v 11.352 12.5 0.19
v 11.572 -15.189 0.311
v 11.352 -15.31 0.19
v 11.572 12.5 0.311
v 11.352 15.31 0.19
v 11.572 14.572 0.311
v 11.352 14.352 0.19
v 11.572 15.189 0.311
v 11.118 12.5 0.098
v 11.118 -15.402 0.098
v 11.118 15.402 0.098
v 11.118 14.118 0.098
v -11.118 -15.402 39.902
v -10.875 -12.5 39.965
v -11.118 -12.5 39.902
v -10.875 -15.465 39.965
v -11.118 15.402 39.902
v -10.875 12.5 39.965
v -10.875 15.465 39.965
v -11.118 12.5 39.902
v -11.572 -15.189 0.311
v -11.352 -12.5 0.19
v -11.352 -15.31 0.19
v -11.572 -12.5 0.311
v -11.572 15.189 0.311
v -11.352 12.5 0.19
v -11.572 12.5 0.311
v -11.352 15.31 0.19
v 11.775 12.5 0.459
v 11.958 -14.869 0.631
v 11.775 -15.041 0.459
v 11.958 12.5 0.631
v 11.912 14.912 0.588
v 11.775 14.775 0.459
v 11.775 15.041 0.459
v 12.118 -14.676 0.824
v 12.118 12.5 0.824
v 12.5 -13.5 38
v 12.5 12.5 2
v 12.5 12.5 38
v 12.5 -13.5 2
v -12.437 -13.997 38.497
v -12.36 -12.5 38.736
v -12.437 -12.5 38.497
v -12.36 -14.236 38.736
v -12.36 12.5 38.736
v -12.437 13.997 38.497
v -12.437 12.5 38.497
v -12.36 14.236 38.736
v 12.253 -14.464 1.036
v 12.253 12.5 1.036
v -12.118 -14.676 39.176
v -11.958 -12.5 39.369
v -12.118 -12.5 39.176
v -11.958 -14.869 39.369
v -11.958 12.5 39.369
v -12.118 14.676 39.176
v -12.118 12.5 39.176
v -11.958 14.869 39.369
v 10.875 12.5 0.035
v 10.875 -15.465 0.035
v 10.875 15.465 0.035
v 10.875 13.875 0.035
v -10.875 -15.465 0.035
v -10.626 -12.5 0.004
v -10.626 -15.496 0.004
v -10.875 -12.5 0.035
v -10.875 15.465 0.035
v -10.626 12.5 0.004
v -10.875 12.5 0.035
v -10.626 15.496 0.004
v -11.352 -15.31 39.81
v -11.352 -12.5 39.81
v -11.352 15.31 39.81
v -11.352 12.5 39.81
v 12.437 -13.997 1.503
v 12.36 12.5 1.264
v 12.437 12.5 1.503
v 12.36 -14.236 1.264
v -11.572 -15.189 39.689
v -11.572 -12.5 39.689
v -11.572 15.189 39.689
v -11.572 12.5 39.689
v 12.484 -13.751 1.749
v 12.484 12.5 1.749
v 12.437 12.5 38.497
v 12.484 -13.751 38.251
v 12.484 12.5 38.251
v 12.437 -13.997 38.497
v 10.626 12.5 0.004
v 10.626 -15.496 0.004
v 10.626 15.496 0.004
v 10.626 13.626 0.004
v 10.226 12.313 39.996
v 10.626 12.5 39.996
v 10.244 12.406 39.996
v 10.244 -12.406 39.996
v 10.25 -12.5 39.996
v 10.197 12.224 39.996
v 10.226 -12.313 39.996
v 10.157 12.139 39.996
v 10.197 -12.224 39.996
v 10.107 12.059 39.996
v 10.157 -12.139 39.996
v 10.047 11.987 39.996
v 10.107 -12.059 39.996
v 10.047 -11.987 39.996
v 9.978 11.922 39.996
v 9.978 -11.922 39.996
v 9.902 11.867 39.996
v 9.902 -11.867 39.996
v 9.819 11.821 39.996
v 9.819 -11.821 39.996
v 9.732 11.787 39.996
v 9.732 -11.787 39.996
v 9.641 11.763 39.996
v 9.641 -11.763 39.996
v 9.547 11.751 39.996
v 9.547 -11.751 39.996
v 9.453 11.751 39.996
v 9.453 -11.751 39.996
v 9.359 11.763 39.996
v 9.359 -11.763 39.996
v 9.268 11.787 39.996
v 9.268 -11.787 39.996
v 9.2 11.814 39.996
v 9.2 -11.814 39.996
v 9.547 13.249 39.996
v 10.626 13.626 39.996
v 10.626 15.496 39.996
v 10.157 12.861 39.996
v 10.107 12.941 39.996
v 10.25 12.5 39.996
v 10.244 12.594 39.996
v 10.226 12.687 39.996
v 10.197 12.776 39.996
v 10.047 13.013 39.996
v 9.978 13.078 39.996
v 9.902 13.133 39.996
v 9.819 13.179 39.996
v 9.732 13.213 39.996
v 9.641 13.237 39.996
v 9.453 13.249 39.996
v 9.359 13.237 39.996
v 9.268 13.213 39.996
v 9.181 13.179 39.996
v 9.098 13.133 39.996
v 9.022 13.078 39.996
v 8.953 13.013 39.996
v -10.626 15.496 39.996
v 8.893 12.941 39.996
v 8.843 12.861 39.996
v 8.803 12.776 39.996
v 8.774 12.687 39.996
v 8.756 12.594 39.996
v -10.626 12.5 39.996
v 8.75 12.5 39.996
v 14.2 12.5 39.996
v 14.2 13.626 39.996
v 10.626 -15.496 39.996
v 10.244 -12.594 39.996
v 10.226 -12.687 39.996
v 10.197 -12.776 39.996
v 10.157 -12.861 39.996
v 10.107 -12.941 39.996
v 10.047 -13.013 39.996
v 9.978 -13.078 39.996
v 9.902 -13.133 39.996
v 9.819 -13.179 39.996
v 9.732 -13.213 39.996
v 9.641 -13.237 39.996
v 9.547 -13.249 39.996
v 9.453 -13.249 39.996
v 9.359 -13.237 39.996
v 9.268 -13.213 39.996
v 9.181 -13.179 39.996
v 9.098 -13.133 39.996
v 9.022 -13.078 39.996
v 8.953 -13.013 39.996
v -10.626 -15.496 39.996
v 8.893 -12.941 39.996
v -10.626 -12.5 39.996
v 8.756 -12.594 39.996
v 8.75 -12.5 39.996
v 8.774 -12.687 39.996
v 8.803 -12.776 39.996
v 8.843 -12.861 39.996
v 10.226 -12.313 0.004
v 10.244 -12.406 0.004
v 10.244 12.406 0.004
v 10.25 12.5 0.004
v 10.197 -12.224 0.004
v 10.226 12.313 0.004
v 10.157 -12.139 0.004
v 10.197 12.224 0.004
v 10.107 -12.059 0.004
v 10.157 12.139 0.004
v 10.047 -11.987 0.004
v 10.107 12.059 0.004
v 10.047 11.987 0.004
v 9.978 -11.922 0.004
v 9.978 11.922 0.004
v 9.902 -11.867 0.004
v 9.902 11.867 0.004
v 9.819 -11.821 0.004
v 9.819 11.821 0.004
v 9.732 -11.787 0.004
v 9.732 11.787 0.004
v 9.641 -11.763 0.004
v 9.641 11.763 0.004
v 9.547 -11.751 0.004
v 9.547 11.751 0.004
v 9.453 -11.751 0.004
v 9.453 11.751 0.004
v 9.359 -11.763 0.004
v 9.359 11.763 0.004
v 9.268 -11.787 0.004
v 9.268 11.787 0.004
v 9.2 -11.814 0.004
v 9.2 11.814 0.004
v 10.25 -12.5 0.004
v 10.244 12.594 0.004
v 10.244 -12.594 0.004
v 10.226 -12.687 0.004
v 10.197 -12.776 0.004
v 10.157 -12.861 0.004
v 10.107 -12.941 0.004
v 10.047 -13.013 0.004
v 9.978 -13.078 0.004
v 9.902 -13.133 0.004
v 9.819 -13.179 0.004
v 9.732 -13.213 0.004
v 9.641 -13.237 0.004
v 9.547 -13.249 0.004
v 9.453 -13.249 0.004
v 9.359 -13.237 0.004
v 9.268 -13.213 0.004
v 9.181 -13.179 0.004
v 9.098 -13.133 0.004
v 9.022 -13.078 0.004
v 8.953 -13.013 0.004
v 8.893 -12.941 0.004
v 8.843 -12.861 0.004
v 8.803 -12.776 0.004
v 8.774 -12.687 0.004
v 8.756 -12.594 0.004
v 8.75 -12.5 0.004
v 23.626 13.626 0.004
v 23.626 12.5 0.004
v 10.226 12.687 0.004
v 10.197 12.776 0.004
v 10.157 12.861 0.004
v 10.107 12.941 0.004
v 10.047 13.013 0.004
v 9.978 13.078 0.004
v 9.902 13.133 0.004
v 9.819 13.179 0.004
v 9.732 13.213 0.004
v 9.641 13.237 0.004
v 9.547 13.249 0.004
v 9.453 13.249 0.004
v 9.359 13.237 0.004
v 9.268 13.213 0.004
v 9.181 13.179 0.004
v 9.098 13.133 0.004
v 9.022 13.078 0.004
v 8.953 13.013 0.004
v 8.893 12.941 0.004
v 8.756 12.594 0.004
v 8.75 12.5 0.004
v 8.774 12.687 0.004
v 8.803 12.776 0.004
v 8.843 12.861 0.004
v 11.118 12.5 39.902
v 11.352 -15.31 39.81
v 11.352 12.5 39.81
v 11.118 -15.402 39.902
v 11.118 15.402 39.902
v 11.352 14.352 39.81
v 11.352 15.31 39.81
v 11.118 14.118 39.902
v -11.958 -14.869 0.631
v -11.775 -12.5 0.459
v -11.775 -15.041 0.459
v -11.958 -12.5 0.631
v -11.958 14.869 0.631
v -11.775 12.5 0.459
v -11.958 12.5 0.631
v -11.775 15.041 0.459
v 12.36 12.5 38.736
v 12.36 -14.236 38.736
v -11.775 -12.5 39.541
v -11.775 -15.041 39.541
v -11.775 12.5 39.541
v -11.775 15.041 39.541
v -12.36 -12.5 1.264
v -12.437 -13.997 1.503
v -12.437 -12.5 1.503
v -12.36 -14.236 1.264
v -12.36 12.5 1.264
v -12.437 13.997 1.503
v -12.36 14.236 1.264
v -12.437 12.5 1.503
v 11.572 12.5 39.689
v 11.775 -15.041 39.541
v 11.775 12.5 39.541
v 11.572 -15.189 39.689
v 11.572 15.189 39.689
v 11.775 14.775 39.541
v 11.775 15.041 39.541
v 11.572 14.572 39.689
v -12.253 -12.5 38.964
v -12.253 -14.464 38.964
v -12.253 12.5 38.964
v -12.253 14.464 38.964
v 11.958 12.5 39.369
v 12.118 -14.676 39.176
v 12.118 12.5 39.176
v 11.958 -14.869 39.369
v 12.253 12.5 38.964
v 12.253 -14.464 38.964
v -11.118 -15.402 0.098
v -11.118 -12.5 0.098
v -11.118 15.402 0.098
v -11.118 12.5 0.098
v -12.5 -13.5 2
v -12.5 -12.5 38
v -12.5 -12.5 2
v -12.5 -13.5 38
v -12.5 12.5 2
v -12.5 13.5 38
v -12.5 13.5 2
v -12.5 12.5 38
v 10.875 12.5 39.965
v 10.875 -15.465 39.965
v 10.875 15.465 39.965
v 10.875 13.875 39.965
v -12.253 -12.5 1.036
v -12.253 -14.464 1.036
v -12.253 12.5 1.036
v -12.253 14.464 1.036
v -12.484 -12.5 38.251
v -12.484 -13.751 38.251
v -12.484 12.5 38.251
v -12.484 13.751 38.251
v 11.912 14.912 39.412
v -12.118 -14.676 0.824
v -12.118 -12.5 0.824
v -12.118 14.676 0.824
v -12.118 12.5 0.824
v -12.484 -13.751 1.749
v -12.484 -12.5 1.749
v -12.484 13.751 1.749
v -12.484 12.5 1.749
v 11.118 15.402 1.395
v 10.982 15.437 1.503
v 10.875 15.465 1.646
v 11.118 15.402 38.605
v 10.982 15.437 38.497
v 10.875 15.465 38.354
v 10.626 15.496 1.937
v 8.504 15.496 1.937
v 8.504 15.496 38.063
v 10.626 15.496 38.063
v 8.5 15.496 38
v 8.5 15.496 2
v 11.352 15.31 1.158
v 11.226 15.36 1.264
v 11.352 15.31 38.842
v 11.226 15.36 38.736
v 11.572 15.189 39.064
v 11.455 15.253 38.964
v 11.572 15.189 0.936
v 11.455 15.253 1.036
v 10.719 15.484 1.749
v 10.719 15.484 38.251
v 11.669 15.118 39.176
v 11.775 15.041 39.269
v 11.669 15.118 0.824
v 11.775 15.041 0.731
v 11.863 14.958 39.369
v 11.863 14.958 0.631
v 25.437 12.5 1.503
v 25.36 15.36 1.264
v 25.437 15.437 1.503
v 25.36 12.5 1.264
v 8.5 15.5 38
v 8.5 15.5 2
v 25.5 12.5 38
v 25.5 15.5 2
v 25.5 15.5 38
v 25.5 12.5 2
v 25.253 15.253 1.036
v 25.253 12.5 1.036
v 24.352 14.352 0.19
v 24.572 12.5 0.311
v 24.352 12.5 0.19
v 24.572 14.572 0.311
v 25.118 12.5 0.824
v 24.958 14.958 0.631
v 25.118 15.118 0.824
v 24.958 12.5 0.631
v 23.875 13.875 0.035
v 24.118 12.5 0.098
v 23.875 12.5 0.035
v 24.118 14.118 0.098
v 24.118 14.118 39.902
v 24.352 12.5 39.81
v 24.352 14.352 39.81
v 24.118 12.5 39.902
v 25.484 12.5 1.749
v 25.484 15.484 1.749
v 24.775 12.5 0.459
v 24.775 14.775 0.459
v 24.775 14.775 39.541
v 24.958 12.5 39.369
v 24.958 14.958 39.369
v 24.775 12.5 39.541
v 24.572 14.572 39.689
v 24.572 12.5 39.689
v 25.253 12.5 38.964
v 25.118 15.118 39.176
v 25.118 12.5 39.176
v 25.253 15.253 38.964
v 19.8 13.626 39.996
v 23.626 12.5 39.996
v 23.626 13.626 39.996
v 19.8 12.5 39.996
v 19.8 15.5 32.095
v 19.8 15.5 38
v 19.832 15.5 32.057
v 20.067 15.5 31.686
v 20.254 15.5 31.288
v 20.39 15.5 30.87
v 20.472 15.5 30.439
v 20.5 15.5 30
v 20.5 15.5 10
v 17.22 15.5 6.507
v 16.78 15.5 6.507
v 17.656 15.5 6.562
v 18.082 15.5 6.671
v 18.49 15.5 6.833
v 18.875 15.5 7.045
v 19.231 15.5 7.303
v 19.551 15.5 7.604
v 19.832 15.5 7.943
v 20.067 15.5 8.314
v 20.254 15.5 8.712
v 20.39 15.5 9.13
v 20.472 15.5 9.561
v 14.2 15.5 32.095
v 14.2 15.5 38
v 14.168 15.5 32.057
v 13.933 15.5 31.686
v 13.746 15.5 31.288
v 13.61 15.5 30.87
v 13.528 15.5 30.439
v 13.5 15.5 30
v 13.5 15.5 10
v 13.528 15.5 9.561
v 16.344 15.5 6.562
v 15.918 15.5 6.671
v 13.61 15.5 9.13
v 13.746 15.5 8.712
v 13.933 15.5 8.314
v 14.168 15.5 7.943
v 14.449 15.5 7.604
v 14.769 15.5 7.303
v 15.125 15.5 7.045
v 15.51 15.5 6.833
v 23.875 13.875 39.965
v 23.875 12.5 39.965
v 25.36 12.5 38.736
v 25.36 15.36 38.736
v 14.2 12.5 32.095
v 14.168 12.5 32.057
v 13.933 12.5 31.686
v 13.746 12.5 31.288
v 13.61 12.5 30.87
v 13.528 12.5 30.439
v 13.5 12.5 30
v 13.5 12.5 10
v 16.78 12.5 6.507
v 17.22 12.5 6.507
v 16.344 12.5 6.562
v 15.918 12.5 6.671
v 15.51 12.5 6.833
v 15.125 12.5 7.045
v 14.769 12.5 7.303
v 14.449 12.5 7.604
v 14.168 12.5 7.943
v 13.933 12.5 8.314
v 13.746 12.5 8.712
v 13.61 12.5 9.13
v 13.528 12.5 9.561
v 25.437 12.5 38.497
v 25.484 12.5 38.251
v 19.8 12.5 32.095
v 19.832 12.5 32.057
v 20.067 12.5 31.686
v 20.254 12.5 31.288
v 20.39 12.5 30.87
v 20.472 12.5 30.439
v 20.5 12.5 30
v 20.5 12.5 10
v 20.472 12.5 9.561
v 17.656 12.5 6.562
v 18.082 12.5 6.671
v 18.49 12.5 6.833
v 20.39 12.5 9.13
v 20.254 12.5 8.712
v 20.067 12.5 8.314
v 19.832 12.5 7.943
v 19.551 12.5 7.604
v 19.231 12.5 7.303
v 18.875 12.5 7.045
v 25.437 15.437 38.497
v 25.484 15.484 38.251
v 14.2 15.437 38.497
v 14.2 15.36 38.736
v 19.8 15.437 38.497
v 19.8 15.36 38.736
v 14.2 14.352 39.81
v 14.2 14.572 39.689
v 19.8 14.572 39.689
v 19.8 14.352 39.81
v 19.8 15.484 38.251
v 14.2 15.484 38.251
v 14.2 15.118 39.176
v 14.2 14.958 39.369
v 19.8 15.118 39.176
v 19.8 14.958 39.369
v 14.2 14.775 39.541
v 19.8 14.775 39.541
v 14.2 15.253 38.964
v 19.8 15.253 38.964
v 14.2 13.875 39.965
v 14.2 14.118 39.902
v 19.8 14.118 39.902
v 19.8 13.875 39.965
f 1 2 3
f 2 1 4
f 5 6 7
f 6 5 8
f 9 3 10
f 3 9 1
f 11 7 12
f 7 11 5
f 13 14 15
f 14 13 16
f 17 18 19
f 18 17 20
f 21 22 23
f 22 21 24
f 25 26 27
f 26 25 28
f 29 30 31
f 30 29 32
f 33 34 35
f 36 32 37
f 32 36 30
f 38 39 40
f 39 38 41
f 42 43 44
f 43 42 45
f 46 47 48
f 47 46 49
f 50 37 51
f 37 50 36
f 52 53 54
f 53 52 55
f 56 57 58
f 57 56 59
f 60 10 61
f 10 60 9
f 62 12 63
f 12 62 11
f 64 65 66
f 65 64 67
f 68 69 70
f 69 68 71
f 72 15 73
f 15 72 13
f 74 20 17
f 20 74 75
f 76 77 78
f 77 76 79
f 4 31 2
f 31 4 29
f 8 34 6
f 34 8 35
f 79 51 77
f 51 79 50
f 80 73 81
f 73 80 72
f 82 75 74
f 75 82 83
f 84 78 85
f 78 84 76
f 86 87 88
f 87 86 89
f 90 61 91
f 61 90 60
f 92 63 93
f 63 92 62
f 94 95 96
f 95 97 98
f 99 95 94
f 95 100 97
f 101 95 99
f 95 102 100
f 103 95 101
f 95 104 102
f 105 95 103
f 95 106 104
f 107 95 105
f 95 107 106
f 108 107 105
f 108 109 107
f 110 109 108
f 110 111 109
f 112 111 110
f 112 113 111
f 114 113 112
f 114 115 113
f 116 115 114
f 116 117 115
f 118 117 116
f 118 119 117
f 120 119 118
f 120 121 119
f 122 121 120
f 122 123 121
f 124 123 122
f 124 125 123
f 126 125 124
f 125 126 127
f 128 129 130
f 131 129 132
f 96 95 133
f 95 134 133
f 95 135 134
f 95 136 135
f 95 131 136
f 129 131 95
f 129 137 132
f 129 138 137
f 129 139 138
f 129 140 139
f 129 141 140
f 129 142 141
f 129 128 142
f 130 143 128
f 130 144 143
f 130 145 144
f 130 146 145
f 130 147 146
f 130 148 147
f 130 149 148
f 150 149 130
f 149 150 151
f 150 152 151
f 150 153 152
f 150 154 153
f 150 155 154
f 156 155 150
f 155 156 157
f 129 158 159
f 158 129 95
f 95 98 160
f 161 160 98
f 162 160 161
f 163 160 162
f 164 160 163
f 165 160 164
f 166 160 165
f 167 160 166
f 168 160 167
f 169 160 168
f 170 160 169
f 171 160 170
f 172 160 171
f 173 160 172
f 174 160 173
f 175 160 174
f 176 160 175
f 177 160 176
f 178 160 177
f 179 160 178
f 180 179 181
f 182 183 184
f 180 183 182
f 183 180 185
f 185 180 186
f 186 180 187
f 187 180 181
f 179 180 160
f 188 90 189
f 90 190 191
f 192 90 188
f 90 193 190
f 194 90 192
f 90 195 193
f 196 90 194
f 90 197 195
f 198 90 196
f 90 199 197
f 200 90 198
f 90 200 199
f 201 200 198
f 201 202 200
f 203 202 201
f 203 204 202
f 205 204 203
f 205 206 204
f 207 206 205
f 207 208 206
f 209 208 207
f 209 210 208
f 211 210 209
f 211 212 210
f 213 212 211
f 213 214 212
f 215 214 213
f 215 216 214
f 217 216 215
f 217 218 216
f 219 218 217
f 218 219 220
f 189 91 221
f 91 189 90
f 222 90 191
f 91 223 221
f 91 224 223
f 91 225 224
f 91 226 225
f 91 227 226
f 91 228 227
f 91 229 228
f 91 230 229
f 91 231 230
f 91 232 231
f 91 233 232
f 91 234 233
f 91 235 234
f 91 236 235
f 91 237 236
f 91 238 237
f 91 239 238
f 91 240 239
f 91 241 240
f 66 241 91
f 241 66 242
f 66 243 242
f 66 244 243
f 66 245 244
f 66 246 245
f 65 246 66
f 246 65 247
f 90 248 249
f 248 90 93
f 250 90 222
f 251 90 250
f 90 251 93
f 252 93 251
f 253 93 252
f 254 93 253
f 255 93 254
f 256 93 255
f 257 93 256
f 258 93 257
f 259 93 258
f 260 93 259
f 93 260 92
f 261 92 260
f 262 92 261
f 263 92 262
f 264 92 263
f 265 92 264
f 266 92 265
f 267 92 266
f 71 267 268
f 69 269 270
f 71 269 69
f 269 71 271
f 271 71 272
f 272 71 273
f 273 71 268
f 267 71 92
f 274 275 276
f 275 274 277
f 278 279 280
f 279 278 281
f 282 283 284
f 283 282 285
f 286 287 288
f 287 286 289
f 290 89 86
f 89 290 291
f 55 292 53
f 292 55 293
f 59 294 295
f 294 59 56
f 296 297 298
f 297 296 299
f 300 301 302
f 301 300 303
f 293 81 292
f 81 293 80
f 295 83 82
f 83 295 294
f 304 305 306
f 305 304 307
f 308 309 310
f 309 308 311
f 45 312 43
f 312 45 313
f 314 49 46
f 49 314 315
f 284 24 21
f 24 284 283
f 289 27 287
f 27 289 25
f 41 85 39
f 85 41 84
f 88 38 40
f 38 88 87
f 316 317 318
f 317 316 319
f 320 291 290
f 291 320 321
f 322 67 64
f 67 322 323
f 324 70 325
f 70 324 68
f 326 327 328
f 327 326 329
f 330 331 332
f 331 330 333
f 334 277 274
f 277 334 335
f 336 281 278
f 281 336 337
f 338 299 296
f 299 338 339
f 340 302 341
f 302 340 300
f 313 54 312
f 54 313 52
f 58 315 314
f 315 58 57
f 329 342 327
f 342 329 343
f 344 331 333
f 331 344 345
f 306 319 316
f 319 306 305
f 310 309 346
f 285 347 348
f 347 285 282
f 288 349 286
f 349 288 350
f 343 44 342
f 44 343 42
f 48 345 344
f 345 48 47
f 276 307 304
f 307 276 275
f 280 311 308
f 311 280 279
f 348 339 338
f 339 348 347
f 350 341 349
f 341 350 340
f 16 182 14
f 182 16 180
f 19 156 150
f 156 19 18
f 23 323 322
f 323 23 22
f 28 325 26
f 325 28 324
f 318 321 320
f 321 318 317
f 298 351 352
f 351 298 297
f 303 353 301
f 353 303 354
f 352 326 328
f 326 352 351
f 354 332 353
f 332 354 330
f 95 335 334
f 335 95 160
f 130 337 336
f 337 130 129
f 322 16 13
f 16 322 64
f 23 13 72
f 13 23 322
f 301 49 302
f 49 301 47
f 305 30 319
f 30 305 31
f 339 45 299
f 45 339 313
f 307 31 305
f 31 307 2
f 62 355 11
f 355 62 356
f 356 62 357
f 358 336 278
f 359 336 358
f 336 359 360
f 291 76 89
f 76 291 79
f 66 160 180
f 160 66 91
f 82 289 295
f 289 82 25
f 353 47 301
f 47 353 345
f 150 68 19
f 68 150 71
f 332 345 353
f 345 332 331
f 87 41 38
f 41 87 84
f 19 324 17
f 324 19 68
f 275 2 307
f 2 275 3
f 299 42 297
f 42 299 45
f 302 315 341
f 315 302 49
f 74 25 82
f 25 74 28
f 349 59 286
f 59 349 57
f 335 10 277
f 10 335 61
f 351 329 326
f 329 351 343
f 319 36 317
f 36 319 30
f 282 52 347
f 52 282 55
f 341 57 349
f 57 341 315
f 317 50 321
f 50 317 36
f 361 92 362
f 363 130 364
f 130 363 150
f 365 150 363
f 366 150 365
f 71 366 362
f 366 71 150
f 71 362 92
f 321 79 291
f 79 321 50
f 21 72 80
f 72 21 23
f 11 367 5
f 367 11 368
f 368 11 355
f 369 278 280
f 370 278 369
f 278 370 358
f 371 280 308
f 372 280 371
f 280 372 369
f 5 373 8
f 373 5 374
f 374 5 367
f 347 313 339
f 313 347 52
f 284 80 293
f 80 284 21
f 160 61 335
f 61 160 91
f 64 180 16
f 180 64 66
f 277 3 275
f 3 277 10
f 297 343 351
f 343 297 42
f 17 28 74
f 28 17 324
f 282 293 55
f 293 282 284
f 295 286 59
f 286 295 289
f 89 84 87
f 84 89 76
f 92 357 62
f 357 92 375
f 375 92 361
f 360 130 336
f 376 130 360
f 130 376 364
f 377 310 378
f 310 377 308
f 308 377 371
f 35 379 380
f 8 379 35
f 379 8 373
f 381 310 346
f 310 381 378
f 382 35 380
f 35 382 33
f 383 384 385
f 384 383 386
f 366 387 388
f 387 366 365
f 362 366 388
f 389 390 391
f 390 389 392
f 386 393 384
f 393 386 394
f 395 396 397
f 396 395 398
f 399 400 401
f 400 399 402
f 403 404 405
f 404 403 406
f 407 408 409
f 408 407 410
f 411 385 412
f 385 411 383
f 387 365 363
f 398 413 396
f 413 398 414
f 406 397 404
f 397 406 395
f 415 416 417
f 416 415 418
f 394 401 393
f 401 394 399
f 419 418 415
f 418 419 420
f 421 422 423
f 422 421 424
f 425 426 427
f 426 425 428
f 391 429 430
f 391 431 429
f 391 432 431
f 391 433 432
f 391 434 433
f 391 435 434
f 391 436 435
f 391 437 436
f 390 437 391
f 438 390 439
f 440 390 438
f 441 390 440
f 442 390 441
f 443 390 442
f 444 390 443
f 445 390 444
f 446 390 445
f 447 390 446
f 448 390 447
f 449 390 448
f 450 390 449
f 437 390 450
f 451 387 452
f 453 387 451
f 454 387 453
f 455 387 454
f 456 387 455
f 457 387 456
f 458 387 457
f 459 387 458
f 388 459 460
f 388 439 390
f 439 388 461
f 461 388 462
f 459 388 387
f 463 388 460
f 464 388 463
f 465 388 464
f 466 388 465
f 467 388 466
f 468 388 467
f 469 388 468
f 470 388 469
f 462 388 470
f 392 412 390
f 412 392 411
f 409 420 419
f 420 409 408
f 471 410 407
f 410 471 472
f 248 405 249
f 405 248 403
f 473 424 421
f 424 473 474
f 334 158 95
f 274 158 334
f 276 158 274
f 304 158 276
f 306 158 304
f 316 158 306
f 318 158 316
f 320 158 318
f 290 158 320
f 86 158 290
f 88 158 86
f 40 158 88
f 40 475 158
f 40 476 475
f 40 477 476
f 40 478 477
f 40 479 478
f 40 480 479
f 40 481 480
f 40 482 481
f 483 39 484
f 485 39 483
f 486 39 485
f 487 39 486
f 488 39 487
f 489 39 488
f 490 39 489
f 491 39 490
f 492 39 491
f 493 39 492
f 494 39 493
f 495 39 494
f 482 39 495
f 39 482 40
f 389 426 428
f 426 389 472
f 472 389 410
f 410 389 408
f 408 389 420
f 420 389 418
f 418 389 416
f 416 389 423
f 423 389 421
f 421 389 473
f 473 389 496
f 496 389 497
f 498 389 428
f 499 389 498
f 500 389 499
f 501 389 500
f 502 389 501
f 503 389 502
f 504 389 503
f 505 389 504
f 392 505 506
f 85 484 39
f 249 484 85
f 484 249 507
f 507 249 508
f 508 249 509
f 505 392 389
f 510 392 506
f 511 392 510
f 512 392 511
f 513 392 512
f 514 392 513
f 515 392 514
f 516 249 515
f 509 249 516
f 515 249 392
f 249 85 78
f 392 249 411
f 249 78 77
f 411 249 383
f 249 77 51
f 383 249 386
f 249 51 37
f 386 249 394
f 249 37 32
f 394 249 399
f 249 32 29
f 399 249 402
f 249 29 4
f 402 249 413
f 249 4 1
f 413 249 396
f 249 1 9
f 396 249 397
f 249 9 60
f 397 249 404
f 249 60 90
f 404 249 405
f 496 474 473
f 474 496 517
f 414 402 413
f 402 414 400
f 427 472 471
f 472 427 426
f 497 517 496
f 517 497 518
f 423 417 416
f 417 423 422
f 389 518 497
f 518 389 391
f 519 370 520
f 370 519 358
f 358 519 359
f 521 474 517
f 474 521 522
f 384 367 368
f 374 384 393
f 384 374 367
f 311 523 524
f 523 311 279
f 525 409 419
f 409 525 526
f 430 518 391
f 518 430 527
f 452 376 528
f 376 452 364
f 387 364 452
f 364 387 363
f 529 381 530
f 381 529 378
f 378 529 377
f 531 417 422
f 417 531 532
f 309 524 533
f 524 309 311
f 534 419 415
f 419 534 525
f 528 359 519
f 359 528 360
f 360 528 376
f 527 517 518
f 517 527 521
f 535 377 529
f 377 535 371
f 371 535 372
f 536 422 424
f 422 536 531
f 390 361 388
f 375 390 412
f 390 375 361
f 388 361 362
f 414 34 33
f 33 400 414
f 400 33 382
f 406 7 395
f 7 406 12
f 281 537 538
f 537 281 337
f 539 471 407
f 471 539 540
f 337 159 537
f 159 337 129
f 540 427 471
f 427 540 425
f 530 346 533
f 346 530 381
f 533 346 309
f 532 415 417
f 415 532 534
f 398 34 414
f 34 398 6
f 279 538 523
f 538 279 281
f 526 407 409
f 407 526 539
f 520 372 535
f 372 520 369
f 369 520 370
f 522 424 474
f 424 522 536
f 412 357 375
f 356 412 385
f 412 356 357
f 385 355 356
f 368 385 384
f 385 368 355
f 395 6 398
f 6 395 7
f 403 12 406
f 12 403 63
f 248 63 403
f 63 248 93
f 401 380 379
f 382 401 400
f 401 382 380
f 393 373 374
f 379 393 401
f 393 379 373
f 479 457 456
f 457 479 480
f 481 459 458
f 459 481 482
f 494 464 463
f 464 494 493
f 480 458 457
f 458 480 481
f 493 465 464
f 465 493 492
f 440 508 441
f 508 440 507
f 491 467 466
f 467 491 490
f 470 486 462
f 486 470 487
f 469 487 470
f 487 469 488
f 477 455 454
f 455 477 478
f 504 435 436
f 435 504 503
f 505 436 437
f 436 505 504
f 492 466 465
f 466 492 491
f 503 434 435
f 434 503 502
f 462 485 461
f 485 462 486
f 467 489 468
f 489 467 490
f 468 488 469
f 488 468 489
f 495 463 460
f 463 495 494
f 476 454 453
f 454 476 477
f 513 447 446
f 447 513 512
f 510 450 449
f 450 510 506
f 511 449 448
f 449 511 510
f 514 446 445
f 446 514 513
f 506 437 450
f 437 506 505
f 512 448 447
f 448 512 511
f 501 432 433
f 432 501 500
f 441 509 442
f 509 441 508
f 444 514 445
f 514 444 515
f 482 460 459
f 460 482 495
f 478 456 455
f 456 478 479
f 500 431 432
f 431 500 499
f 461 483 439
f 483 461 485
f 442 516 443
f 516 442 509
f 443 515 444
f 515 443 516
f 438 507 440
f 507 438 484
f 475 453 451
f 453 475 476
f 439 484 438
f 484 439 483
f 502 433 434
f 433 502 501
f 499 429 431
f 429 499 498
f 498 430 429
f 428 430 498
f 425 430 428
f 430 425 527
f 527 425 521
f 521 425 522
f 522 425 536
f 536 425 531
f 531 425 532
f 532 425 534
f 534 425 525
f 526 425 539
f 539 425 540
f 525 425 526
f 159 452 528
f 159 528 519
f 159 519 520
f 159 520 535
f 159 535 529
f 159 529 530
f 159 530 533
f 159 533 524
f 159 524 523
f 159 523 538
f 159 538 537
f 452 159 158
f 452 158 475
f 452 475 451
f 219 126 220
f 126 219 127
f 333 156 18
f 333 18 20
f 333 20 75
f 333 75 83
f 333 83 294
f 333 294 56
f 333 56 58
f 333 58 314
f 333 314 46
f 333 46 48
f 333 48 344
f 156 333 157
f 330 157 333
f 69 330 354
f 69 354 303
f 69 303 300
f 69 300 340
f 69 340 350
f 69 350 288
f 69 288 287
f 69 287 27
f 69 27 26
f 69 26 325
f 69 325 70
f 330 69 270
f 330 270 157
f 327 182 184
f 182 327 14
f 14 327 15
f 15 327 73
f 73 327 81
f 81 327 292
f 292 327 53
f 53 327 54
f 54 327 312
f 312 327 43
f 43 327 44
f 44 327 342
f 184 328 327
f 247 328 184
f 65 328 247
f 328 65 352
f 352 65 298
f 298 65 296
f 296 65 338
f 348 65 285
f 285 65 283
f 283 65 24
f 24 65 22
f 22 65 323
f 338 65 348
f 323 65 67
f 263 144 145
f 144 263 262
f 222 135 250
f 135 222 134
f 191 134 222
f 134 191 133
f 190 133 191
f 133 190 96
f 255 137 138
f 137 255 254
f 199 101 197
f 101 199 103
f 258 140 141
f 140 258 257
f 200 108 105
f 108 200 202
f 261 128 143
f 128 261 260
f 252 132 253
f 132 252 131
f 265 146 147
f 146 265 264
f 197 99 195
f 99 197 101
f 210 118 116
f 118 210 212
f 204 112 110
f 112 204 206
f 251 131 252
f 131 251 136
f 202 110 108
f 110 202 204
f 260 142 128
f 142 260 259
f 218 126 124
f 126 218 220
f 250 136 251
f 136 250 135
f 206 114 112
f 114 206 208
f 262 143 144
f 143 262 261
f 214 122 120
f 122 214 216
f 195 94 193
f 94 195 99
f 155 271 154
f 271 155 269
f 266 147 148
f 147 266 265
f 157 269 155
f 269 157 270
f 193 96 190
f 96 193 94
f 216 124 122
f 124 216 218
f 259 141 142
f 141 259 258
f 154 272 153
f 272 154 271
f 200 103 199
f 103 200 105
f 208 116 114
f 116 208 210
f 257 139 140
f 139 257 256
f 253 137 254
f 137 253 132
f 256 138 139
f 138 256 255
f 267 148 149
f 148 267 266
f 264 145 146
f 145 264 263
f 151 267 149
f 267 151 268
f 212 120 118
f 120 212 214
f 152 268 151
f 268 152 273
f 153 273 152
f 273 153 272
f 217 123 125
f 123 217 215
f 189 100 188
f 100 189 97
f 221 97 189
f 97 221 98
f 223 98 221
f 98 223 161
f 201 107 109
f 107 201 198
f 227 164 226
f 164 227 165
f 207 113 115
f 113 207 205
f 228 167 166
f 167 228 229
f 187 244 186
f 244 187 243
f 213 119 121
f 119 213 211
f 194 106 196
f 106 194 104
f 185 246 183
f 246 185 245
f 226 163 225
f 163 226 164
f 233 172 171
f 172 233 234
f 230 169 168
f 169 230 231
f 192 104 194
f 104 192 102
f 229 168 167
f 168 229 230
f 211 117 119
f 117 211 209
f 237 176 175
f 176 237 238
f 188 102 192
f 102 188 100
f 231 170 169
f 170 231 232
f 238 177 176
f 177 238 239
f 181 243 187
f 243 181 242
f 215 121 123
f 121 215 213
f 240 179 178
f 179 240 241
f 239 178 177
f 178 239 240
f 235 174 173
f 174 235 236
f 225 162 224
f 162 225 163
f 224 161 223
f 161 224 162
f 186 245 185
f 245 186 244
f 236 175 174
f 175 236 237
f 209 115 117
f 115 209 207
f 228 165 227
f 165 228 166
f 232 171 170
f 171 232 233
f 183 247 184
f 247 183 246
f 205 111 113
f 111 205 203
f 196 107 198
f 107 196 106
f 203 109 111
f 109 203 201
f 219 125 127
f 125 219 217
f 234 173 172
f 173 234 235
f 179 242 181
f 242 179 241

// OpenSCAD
// Cable holder

tableThick = 25;
clipThick = 3;
clipLength = 25;
cableDiam = 7;
holdLength = 2*cableDiam+clipThick;
yLength = 40;

// Position Clip to be printable
translate([0,0,0.5*yLength]) rotate([-90,0,0]) 
clip();

module clip() {
 // Base d'attache à la table
 difference() {
     union() 
     {
        // cube([clipLength, yLength, tableThick+clipThick*2], true);
        intersection() {
            roundedBox(clipLength,yLength,tableThick+clipThick*2,2);
            rotate([90,0,0]) 
                roundedBox(clipLength,tableThick+clipThick*2,yLength,2);            
        }
        // Plateau pour accrocher le cable
        translate([holdLength,0,(tableThick+clipThick)*0.5]) 
        { 
            difference() {
                //cube([clipLength, yLength, clipThick], true);
                intersection() {
                    roundedBox(holdLength, yLength, clipThick, 2);
                    translate([0,0,-0.5*clipThick]) rotate([0,90,0]) 
                    roundedBox(clipThick*2, yLength, holdLength,2);
                }
                // Trous pour le cable
                hull() {
                    translate([0, -0.25*yLength, -clipThick/2])
                        cylinder(h=clipThick,d=cableDiam, $fn=50);
                    translate([0, 0.25*yLength, -clipThick/2])
                        cylinder(h=clipThick, d=cableDiam, $fn=50);
                }
                #translate([0, -0.3*yLength, 0]) 
                    cube([0.8*cableDiam, 0.5*yLength, clipThick], true);
            }
        }
    }
    translate([-1.1*clipThick,0,0]) cube([clipLength, yLength, tableThick], true);
    #translate([clipLength/2-clipThick,yLength/2,tableThick/2]) 
        rotate([90,0,0]) 
        cylinder(h=yLength,d=1.5, $fn=50);
    #translate([clipLength/2-clipThick,yLength/2,-tableThick/2]) 
        rotate([90,0,0]) 
        cylinder(h=yLength,d=1.5, $fn=50);
 }
}

module roundedBox(x,y,z,rad){
	hull() {
        translate([-x/2+rad, y/2-rad,-z/2]) cylinder(h=z,r=rad, $fn=50);
        translate([ x/2-rad, y/2-rad,-z/2]) cylinder(h=z,r=rad, $fn=50);
        translate([-x/2+rad,-y/2+rad,-z/2]) cylinder(h=z,r=rad, $fn=50);
        translate([ x/2-rad,-y/2+rad,-z/2]) cylinder(h=z,r=rad, $fn=50);
   }
}
